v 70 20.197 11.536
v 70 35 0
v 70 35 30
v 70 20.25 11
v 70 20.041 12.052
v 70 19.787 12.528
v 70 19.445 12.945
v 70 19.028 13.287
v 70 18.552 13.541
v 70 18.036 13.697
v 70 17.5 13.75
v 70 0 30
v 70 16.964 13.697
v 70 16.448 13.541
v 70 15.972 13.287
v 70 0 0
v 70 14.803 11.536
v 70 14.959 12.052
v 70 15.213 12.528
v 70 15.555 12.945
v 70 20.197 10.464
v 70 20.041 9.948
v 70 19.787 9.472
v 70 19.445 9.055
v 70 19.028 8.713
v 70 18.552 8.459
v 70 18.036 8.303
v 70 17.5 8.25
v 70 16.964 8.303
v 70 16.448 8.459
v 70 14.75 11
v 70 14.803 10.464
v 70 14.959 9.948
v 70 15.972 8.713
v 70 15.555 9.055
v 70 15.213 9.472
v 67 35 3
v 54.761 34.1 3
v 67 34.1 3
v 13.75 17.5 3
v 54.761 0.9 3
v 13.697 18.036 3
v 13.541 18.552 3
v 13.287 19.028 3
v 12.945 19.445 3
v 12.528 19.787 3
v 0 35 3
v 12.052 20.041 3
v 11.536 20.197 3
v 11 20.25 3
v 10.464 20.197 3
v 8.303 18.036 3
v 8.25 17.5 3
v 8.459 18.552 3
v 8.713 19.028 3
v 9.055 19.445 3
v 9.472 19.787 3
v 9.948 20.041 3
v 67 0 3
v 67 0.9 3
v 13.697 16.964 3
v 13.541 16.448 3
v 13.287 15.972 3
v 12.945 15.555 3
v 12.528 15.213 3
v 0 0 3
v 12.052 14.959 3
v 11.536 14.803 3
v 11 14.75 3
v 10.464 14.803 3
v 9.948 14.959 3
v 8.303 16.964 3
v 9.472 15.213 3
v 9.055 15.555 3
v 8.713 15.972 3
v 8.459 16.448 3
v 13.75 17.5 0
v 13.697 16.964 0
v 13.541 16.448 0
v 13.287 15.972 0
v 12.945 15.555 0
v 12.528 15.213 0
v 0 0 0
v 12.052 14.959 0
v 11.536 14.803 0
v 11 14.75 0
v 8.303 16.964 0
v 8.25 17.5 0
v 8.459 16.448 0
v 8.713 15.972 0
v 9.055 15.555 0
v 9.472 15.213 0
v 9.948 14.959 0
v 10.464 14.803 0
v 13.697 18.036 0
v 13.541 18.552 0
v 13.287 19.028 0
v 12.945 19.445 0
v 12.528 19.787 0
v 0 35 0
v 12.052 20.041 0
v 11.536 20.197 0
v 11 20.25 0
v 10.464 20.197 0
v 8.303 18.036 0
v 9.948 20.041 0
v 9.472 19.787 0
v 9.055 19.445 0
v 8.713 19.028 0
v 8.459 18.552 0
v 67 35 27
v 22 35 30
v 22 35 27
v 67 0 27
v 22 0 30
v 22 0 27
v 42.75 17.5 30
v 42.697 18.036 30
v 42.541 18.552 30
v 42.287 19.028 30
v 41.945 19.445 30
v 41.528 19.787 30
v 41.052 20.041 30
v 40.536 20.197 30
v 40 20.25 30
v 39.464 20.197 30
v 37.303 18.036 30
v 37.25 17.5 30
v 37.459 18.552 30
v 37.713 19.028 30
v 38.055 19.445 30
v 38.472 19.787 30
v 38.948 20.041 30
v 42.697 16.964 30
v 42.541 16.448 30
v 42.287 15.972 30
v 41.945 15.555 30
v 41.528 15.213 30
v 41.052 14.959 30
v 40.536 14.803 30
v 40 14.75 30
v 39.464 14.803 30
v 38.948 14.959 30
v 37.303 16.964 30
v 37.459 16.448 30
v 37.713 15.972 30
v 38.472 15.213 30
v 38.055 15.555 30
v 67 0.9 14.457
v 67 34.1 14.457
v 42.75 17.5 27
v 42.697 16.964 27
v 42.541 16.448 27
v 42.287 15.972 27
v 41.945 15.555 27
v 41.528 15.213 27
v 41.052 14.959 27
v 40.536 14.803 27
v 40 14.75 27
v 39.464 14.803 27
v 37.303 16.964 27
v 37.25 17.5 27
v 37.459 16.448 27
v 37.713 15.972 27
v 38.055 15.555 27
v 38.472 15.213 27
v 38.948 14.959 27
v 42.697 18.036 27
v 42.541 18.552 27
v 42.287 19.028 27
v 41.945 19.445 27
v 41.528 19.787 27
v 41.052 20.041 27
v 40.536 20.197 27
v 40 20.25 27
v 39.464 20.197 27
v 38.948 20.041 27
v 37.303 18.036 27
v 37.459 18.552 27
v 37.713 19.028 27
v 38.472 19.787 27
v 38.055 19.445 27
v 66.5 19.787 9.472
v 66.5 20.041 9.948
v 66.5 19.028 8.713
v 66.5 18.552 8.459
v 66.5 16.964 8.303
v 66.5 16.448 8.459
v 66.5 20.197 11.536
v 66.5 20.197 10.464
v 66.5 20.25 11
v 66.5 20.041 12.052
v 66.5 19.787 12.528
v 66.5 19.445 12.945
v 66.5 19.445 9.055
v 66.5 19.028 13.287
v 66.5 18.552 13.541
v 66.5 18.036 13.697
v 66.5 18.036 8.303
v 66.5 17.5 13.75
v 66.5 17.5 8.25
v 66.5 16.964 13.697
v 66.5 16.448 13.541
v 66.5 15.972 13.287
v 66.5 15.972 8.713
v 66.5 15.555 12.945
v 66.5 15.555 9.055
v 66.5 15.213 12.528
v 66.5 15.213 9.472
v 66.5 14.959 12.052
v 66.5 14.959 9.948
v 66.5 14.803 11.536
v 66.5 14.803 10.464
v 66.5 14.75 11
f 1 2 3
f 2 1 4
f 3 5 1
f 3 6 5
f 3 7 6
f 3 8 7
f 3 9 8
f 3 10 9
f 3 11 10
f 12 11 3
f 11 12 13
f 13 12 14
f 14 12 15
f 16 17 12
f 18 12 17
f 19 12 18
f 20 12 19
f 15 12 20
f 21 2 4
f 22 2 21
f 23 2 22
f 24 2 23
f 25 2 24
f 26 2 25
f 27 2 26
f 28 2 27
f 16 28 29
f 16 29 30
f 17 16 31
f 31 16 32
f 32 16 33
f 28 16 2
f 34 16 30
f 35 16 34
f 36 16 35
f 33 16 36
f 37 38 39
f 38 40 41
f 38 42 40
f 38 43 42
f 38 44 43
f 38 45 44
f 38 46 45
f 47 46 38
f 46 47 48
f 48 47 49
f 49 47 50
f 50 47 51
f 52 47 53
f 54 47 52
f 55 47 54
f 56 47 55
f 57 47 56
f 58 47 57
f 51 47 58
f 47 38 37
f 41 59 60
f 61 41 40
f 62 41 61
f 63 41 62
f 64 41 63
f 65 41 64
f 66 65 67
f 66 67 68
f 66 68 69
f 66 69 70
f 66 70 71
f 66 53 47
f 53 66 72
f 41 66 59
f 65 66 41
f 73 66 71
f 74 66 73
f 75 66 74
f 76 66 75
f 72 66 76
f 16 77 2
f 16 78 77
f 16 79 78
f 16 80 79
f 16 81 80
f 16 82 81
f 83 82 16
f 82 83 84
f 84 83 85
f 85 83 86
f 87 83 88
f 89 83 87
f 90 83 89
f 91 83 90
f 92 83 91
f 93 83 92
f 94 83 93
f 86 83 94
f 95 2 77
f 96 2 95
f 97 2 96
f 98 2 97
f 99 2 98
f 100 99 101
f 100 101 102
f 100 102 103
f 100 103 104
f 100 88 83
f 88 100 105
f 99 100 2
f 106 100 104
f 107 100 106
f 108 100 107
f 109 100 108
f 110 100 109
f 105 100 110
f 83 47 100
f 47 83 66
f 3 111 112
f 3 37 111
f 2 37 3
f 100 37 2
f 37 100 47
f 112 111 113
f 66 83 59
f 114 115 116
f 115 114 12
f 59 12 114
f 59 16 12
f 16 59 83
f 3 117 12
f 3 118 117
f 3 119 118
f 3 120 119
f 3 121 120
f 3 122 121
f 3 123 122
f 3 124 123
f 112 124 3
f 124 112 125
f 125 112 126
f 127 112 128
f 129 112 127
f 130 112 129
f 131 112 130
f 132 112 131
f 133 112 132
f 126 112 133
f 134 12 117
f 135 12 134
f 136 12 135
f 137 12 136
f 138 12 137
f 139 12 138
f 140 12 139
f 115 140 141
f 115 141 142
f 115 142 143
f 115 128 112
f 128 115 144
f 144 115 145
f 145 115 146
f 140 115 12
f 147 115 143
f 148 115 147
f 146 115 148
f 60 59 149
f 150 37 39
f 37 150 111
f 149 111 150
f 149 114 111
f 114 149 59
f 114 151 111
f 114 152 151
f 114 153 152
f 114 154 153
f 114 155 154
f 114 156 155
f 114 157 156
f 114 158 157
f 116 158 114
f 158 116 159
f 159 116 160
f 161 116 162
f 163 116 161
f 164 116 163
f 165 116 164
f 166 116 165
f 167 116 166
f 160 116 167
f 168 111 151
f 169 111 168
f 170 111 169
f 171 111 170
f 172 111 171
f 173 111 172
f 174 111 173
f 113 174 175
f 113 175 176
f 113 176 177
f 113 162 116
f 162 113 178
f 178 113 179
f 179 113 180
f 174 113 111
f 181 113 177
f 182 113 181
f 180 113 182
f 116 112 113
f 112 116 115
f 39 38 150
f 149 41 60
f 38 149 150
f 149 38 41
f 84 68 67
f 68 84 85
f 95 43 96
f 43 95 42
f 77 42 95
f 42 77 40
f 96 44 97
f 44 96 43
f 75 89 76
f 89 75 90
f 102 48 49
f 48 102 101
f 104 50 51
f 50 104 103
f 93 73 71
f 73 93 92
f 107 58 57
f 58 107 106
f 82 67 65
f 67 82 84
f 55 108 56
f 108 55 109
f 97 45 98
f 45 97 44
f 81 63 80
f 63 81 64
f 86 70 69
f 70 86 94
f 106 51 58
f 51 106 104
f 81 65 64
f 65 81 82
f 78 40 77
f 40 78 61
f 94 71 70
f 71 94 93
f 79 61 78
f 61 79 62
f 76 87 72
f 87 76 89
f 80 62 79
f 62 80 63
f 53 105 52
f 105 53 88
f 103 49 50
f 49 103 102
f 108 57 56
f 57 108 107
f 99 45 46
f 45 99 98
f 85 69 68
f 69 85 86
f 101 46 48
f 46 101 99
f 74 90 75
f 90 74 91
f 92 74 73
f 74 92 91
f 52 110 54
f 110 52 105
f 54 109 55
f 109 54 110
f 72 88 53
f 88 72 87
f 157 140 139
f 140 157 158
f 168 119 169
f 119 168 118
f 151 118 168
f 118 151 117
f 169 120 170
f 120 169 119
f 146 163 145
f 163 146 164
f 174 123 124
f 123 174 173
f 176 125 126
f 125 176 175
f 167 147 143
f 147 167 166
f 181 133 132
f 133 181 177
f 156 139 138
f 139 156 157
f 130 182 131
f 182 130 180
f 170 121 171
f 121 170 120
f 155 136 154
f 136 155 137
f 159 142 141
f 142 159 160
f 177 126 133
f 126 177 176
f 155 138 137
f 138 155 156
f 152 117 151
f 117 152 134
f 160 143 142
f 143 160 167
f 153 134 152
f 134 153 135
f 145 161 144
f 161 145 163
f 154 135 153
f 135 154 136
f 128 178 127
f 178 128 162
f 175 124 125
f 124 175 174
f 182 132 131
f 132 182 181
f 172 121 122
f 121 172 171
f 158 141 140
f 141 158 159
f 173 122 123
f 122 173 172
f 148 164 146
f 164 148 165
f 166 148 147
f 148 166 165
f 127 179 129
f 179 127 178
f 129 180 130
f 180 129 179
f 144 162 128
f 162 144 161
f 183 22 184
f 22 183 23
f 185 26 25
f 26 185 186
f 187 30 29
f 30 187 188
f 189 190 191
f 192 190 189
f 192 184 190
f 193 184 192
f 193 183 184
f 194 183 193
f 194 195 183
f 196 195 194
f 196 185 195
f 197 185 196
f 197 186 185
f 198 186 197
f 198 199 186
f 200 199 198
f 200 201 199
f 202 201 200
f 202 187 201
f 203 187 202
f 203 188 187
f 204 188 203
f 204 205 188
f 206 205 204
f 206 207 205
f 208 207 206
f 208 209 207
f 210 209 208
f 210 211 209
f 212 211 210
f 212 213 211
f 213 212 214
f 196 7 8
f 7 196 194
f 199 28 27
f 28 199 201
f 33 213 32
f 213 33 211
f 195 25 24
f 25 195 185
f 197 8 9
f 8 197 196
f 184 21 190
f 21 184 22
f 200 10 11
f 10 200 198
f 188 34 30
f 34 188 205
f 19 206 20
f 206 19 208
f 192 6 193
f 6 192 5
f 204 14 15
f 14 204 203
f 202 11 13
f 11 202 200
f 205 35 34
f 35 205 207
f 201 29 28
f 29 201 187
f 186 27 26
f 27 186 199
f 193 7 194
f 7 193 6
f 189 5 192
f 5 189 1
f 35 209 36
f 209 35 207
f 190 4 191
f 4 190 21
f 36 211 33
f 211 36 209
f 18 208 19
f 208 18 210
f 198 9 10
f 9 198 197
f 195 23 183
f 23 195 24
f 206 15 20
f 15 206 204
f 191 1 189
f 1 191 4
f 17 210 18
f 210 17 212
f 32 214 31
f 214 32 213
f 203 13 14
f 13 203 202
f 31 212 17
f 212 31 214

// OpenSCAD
$fn = 32;

// ----------------------------------------------------------------------
// Z-bracket: 70 x 35 x 30 mm
// ----------------------------------------------------------------------

// --- parameters (mm) ---
bottom_run = 70;          // lower foot length, X
top_run = 45;             // upper foot length, X
profile_w = 35;           // bracket width, Y
height = 30;              // overall rise, Z
mat_t = 3;                // plate thickness
hole_d = 5.5;             // clearance for M5
rib_len = 13.2;           // gusset leg
rib_sink = 0.9;           // gusset overlap into the plates

module hole_z(px, py, z0) {
  translate([px, py, z0 - 0.5]) cylinder(h = mat_t + 1, d = hole_d);
}
module hole_x(py, pz) {
  translate([-0.5, py, pz]) rotate([0, 90, 0]) cylinder(h = mat_t + 1, d = hole_d);
}
module gusset(x0) {
  translate([x0, profile_w - rib_sink, 0])
    rotate([90, 0, 0])
      linear_extrude(height = profile_w - 2 * rib_sink)
        polygon(points = [[rib_sink, mat_t - rib_sink],
                          [rib_sink, mat_t - rib_sink + rib_len],
                          [-rib_len, mat_t - rib_sink]]);
}

difference() {
  union() {
    cube([bottom_run, profile_w, mat_t]);
    /* web, overlapping the lower foot */
    translate([bottom_run - mat_t, 0, 0]) cube([mat_t, profile_w, height]);
    /* upper foot, sunk into the web */
    translate([bottom_run - mat_t - top_run, 0, height - mat_t]) cube([top_run + mat_t, profile_w, mat_t]);
    gusset(bottom_run - mat_t);
  }
  hole_z(11, 17.5, 0);
  translate([bottom_run - mat_t - 27, 0, 0]) hole_z(0, 17.5, height - mat_t);
  translate([bottom_run - mat_t, 0, 0]) hole_x(17.5, 11);
}
